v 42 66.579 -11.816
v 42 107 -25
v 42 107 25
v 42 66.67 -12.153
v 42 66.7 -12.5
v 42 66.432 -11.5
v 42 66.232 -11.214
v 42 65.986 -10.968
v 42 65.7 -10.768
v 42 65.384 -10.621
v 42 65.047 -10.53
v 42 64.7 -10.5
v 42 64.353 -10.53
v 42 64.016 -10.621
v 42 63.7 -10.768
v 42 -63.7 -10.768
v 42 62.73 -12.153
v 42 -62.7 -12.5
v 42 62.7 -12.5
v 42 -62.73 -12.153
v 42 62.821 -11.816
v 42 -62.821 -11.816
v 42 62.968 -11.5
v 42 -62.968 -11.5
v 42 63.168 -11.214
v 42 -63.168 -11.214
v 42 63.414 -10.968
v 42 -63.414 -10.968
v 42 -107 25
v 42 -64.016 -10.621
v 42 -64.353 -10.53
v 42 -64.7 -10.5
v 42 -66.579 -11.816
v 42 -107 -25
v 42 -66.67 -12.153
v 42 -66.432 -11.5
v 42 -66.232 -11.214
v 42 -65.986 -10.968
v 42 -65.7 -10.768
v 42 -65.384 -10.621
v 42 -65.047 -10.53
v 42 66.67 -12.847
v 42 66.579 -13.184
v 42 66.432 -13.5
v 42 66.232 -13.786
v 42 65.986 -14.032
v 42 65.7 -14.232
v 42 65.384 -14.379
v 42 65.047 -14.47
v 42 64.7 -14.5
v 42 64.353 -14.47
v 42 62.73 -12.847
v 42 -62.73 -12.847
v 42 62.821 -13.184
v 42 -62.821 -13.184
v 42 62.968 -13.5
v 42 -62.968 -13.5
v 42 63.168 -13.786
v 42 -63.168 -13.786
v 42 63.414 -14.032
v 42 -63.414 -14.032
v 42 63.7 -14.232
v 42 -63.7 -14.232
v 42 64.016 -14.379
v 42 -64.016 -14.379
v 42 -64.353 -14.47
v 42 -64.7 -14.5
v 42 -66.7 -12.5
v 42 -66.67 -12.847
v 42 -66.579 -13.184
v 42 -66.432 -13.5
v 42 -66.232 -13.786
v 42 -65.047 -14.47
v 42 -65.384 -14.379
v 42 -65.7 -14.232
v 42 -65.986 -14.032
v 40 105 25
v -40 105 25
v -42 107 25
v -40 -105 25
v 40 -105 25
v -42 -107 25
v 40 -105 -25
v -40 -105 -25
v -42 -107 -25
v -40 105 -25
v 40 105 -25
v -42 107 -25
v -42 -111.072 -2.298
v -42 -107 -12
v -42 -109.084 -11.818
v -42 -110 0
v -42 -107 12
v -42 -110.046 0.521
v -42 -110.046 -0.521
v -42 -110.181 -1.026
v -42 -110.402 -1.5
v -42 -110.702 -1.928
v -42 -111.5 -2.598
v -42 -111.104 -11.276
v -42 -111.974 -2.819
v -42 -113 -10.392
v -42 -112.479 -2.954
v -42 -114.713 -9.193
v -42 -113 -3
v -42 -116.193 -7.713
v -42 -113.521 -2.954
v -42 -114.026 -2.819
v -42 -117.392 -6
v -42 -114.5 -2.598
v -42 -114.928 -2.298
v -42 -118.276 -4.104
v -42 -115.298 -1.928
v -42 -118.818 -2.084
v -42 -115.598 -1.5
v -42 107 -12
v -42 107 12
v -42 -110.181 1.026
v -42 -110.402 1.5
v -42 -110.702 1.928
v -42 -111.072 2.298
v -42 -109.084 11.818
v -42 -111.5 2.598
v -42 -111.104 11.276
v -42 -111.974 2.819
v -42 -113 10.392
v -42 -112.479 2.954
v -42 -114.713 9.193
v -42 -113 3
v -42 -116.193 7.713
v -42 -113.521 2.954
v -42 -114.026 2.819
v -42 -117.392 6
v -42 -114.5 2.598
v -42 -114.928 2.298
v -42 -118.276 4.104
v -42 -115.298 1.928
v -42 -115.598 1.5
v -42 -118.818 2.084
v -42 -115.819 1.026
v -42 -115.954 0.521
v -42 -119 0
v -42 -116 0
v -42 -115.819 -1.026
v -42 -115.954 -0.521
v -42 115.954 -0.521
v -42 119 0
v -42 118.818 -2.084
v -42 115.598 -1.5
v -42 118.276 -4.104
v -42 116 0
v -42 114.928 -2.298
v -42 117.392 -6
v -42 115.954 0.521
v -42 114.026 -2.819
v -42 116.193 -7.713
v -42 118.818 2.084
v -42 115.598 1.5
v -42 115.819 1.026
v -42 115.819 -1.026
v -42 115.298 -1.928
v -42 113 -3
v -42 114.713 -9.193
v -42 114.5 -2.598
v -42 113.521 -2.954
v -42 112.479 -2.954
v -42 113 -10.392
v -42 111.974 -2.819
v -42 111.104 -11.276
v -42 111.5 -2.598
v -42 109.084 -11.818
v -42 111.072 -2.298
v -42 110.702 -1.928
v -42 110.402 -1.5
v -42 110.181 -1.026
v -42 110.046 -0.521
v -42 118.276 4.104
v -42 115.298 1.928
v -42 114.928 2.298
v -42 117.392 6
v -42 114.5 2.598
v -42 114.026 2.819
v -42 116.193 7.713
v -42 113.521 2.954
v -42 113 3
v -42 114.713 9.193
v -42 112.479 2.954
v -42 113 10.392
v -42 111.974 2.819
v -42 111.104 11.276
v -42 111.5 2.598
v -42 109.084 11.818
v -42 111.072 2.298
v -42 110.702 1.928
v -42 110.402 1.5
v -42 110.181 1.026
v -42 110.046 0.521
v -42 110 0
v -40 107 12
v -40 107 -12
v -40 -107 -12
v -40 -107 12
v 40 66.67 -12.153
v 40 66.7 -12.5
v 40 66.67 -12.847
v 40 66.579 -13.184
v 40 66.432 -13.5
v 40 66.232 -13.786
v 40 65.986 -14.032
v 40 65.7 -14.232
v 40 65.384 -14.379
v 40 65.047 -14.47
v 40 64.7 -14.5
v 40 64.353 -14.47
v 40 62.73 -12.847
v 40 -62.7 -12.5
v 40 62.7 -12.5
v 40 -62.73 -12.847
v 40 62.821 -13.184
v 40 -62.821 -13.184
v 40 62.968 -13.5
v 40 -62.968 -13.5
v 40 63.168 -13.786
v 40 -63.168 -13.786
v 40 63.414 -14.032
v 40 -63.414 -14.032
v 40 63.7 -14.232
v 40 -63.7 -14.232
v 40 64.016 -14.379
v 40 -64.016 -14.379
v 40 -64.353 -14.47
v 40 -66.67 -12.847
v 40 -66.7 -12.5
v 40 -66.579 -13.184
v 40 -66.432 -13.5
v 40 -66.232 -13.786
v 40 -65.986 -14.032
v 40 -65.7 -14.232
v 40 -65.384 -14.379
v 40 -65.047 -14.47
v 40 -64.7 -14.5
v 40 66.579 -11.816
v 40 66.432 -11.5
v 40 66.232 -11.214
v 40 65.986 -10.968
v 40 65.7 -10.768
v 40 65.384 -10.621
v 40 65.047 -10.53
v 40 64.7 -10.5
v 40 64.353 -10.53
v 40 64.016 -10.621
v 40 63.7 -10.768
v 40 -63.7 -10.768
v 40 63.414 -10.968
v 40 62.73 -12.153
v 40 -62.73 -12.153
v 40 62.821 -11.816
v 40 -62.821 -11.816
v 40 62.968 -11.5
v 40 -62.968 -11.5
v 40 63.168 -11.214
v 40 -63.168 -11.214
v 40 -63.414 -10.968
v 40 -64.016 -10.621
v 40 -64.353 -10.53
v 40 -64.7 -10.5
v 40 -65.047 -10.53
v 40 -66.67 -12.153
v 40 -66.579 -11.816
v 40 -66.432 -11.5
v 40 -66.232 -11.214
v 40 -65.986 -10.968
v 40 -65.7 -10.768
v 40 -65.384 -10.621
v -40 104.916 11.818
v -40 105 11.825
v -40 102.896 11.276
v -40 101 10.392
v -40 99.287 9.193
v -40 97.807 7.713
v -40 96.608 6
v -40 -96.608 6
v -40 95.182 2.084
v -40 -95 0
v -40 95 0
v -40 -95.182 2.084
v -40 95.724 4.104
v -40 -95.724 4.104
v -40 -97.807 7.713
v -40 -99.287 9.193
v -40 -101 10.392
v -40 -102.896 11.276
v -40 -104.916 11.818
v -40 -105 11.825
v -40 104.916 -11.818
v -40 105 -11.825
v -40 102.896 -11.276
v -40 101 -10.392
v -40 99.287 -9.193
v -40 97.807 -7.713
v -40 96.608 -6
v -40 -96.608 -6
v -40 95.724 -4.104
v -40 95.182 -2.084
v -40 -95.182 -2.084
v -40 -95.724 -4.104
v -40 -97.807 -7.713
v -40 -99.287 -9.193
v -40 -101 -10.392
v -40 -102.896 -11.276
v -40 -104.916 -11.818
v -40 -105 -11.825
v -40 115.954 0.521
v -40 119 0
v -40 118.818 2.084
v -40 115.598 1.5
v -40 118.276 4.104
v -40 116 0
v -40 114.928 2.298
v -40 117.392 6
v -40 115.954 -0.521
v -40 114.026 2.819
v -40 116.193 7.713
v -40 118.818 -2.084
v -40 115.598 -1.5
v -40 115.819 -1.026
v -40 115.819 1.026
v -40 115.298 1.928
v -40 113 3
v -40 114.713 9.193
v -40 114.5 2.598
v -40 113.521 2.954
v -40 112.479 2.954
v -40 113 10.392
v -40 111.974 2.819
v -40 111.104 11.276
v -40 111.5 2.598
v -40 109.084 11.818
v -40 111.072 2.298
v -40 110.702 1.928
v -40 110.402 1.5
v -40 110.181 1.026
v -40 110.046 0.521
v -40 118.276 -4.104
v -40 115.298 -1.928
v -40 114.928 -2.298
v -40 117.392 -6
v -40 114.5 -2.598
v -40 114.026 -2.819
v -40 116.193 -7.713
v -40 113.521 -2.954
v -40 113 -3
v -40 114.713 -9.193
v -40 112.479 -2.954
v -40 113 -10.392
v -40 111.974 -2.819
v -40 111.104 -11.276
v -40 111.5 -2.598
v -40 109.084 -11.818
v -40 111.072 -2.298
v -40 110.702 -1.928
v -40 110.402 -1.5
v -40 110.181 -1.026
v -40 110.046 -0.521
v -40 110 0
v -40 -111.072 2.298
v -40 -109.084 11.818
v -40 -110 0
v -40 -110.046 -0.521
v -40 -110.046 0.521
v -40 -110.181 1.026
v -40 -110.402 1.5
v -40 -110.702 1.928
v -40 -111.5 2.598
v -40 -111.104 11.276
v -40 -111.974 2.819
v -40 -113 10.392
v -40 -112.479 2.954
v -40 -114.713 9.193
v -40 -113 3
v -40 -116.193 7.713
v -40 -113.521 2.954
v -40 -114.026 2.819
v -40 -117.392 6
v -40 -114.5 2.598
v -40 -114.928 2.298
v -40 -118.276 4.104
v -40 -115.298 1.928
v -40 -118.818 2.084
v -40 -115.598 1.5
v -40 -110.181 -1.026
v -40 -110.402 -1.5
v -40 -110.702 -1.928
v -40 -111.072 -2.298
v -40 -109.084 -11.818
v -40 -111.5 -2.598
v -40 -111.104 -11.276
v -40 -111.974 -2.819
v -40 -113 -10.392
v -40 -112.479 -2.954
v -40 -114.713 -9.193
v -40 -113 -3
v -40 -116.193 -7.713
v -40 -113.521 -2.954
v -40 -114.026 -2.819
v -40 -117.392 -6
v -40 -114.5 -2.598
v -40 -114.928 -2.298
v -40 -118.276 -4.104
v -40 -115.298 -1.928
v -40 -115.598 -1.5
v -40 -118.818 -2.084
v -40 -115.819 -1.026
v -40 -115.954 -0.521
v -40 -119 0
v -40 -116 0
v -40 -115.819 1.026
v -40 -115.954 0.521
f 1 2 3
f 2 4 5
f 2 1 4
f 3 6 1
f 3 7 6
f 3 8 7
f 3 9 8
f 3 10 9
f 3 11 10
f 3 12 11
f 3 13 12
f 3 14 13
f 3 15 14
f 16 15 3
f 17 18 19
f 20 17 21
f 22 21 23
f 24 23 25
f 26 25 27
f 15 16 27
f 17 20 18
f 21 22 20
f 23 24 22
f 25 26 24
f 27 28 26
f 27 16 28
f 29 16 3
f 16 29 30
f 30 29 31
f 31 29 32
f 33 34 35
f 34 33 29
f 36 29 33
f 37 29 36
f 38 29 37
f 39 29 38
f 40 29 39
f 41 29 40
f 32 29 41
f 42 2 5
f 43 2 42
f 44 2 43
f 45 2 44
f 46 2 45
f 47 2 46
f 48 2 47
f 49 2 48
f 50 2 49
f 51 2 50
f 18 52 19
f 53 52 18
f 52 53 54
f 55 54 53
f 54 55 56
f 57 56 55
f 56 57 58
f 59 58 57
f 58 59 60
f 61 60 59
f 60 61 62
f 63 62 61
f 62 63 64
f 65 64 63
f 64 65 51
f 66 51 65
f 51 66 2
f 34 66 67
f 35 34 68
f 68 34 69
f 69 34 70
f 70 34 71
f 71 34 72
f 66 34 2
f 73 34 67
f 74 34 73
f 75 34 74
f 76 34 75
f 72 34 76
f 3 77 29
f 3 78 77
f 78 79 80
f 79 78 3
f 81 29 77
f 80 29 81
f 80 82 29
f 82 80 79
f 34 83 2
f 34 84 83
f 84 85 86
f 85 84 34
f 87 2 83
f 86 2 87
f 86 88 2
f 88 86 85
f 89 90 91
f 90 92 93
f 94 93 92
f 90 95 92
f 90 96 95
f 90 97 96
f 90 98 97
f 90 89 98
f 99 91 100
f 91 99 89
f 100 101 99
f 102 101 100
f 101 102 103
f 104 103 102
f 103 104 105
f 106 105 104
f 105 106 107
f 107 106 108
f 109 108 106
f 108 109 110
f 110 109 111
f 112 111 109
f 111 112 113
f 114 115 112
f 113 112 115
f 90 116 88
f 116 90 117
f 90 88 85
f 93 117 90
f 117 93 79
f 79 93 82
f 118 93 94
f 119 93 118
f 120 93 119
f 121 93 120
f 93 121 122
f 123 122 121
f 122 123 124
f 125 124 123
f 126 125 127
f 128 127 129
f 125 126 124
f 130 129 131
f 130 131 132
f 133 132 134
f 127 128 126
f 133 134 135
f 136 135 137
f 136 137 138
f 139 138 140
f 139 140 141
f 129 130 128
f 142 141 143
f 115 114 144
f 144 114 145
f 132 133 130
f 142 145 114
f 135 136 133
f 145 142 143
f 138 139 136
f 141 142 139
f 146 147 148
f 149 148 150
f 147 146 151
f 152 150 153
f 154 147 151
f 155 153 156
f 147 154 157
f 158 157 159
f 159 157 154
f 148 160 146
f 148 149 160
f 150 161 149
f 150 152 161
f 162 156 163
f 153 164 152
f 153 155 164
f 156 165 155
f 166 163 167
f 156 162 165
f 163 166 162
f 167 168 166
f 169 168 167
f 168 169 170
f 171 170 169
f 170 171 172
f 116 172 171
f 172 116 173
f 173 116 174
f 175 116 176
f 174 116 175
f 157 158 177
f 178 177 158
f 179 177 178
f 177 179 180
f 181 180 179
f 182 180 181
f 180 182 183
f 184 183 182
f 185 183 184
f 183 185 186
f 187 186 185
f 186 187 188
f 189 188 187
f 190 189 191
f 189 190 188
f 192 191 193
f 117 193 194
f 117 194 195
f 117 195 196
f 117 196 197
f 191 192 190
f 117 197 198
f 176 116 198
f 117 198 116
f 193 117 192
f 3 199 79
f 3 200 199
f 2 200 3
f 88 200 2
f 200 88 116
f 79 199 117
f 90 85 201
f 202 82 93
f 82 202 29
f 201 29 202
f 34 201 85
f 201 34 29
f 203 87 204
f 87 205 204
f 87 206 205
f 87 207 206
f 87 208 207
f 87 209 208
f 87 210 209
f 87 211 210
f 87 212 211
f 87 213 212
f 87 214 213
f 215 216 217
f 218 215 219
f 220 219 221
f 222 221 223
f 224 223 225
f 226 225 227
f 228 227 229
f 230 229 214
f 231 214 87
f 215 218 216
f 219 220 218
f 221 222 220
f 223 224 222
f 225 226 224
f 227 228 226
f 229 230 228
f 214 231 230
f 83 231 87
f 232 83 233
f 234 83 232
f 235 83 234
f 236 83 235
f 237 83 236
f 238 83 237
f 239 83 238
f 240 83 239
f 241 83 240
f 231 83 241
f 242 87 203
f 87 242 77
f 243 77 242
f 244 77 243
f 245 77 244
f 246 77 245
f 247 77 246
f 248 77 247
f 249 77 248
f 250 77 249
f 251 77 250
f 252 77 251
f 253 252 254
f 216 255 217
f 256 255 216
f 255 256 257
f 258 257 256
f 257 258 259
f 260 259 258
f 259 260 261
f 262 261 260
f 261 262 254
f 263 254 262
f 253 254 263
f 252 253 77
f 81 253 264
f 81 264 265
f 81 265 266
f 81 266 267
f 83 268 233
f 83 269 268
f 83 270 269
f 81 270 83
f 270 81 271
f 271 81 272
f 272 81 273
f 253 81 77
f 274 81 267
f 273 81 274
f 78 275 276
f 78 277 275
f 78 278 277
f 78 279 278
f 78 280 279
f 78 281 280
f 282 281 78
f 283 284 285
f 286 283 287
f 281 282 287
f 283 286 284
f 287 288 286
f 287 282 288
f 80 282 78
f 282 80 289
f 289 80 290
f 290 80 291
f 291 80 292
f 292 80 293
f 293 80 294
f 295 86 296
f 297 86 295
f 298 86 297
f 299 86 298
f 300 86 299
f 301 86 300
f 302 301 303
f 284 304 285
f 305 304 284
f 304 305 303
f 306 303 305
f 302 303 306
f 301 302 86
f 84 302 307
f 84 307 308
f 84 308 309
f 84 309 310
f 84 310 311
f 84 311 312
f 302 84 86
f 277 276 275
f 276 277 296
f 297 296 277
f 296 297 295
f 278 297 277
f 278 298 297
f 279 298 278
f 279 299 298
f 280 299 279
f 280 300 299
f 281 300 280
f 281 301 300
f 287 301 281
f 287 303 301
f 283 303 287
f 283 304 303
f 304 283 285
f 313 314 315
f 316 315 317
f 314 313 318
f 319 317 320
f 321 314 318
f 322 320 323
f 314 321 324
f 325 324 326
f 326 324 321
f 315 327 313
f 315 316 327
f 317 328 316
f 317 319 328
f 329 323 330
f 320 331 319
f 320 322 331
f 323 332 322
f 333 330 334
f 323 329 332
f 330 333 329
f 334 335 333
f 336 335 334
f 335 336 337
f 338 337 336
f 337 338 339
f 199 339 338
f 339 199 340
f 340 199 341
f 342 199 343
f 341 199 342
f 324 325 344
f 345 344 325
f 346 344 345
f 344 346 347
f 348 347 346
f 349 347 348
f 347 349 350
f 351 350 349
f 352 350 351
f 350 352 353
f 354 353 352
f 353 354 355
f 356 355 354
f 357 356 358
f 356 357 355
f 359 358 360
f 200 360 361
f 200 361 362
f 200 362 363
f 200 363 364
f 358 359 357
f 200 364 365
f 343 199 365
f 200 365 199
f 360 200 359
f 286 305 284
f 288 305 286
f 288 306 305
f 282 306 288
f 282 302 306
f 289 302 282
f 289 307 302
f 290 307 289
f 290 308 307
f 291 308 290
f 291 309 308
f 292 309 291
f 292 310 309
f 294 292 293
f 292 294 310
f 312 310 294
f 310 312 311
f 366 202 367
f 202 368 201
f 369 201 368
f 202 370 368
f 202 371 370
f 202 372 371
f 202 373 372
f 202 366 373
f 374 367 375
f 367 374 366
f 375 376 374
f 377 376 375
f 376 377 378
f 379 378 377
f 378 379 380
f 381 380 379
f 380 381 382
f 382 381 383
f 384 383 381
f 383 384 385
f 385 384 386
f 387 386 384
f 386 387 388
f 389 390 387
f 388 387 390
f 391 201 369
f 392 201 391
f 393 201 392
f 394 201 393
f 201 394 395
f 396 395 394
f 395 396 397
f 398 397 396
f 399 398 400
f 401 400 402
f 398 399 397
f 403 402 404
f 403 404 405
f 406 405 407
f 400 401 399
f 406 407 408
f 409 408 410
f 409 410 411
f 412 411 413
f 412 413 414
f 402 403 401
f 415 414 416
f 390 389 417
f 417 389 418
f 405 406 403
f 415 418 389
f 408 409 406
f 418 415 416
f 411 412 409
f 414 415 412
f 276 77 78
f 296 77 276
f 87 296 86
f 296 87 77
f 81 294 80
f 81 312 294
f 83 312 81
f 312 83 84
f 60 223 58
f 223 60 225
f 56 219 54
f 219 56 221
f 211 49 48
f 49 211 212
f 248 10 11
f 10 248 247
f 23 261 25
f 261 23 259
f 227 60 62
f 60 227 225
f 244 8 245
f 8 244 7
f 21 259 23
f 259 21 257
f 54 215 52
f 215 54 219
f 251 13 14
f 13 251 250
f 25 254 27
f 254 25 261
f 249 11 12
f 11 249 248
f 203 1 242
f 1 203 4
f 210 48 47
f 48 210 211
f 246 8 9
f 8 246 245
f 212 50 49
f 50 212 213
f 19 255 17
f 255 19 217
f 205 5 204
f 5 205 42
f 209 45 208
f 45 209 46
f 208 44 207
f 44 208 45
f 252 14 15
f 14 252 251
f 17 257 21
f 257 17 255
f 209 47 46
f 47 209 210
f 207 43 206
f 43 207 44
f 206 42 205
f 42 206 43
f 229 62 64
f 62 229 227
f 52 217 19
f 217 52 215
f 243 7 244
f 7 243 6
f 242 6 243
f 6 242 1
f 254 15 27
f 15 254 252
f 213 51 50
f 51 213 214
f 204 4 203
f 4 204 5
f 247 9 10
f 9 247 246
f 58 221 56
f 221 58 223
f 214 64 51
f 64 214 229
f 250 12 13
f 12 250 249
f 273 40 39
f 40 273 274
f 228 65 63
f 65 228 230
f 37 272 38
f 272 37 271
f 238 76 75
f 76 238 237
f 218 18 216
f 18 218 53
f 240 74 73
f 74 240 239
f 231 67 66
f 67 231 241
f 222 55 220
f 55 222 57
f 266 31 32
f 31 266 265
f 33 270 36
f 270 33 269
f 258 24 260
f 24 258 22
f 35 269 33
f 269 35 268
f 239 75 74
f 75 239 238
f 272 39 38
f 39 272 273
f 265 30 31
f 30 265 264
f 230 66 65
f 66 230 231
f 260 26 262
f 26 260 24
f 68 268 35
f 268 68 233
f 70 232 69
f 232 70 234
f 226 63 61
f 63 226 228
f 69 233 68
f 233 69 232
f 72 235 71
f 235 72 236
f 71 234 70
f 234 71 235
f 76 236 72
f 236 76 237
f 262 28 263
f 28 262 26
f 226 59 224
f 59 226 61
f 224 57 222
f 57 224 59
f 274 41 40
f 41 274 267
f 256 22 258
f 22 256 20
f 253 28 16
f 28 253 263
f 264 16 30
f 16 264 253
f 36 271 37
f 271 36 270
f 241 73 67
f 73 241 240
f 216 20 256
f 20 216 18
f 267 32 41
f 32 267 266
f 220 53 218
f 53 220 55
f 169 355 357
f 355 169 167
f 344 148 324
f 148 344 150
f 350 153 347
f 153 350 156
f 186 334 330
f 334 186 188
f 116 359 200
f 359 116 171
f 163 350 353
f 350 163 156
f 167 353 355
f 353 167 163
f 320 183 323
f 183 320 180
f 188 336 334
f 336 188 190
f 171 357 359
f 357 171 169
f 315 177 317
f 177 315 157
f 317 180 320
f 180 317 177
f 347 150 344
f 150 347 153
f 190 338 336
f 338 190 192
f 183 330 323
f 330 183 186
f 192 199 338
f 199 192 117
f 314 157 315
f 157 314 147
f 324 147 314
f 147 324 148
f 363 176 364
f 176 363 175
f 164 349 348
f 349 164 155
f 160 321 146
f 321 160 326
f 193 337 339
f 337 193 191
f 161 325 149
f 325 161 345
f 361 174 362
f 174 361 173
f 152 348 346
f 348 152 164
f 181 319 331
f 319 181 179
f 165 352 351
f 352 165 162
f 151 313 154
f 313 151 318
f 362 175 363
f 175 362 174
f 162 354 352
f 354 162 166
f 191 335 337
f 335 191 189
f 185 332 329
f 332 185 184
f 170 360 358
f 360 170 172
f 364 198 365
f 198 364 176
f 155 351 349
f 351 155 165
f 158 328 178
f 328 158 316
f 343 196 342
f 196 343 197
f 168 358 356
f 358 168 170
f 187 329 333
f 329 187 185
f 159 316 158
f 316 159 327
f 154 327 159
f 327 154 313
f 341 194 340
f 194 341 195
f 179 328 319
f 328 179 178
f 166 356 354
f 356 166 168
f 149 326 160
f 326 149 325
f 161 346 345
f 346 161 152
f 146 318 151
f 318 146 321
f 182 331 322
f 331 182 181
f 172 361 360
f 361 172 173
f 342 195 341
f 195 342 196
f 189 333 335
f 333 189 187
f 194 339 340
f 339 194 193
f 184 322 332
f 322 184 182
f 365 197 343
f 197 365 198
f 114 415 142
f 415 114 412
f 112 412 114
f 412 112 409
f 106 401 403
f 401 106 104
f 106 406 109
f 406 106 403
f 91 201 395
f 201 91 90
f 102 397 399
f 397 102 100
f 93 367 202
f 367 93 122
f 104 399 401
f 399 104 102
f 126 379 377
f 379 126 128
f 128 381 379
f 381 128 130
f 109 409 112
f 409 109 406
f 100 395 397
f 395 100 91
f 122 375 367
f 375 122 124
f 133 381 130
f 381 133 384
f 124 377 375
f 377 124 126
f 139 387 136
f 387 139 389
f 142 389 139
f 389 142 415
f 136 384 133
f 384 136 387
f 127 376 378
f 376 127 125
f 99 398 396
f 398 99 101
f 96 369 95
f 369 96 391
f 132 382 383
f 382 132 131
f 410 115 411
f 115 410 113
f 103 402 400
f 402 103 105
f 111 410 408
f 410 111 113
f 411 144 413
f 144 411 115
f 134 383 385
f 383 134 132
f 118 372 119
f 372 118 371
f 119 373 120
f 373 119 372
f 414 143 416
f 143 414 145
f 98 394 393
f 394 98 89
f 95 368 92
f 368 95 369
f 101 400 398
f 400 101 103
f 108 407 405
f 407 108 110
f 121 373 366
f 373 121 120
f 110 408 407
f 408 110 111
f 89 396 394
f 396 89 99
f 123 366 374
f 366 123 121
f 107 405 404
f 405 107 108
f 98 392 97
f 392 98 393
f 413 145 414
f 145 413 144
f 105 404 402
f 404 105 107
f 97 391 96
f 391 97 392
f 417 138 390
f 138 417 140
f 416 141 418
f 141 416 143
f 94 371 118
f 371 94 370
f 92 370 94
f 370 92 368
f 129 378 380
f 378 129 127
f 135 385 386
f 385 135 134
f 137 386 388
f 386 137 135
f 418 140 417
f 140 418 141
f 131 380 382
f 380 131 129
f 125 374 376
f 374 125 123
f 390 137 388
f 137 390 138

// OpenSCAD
// Diameter of the screw holes for the AP mounting bracket
screwwidth   = 4;
// Distance (center to center) between the screw holes for
// the AP mounting bracket
screwspacing = 129.4;

// thickness of the overall object
shell = 2;

// How much clearance to allow for the AP diameter
apdiameter = 210;
// How much clearance to allow for the AP thickness,
// including room to maneuver into the bracket
apdepth = 80;

// Width of the overall bracket
width = 50;

// Diameter of the screw holes to bolt this bracket to the ceiling
earhole = 6;
// How much margin to build around the bolt holes
earshell = 3;

// a bit extra to make holes clean
extra = 0.1;

$fn = 36;

difference () {
    
    // base shell
    cube([apdepth+(2*shell), apdiameter+(2*shell), width], center=true);
    cube([apdepth, apdiameter, width+(2*extra)], center=true);
    
    // screw holes for the AP bracket
    translate([(apdepth+shell)/2,screwspacing/2,-0.25*width]){
        rotate([0,90,0]){
            cylinder(h=shell+1, d=screwwidth, center=true);
        }
    }
    translate([(apdepth+shell)/2,-screwspacing/2,-0.25*width]){
        rotate([0,90,0]){
            cylinder(h=shell+1, d=screwwidth, center=true);
        }
    }
}


// ears to bolt bracket to ceiling
difference() {
    translate([-((apdepth+shell)/2), (apdiameter/2)+shell, 0]){
        rotate([0,90,0]){
            cylinder(r = (2*earshell)+earhole, h = shell, center=true);
        }
    }
    
    translate([-((apdepth+shell)/2), (apdiameter/2)+(earhole/2)+earshell+shell, 0]){
        rotate([0,90,0]){
            cylinder(d=earhole, h=shell+extra, center=true);
        }
    }
}

difference() {
    translate([-((apdepth+shell)/2), -((apdiameter/2)+shell), 0]){
        rotate([0,90,0]){
            cylinder(r = (2*earshell)+earhole, h = shell, center=true);
        }
    }
       translate([-((apdepth+shell)/2), -((apdiameter/2)+(earhole/2)+earshell+shell), 0]){
        rotate([0,90,0]){
            cylinder(d=earhole, h=shell+extra, center=true);
        }
    }
}
